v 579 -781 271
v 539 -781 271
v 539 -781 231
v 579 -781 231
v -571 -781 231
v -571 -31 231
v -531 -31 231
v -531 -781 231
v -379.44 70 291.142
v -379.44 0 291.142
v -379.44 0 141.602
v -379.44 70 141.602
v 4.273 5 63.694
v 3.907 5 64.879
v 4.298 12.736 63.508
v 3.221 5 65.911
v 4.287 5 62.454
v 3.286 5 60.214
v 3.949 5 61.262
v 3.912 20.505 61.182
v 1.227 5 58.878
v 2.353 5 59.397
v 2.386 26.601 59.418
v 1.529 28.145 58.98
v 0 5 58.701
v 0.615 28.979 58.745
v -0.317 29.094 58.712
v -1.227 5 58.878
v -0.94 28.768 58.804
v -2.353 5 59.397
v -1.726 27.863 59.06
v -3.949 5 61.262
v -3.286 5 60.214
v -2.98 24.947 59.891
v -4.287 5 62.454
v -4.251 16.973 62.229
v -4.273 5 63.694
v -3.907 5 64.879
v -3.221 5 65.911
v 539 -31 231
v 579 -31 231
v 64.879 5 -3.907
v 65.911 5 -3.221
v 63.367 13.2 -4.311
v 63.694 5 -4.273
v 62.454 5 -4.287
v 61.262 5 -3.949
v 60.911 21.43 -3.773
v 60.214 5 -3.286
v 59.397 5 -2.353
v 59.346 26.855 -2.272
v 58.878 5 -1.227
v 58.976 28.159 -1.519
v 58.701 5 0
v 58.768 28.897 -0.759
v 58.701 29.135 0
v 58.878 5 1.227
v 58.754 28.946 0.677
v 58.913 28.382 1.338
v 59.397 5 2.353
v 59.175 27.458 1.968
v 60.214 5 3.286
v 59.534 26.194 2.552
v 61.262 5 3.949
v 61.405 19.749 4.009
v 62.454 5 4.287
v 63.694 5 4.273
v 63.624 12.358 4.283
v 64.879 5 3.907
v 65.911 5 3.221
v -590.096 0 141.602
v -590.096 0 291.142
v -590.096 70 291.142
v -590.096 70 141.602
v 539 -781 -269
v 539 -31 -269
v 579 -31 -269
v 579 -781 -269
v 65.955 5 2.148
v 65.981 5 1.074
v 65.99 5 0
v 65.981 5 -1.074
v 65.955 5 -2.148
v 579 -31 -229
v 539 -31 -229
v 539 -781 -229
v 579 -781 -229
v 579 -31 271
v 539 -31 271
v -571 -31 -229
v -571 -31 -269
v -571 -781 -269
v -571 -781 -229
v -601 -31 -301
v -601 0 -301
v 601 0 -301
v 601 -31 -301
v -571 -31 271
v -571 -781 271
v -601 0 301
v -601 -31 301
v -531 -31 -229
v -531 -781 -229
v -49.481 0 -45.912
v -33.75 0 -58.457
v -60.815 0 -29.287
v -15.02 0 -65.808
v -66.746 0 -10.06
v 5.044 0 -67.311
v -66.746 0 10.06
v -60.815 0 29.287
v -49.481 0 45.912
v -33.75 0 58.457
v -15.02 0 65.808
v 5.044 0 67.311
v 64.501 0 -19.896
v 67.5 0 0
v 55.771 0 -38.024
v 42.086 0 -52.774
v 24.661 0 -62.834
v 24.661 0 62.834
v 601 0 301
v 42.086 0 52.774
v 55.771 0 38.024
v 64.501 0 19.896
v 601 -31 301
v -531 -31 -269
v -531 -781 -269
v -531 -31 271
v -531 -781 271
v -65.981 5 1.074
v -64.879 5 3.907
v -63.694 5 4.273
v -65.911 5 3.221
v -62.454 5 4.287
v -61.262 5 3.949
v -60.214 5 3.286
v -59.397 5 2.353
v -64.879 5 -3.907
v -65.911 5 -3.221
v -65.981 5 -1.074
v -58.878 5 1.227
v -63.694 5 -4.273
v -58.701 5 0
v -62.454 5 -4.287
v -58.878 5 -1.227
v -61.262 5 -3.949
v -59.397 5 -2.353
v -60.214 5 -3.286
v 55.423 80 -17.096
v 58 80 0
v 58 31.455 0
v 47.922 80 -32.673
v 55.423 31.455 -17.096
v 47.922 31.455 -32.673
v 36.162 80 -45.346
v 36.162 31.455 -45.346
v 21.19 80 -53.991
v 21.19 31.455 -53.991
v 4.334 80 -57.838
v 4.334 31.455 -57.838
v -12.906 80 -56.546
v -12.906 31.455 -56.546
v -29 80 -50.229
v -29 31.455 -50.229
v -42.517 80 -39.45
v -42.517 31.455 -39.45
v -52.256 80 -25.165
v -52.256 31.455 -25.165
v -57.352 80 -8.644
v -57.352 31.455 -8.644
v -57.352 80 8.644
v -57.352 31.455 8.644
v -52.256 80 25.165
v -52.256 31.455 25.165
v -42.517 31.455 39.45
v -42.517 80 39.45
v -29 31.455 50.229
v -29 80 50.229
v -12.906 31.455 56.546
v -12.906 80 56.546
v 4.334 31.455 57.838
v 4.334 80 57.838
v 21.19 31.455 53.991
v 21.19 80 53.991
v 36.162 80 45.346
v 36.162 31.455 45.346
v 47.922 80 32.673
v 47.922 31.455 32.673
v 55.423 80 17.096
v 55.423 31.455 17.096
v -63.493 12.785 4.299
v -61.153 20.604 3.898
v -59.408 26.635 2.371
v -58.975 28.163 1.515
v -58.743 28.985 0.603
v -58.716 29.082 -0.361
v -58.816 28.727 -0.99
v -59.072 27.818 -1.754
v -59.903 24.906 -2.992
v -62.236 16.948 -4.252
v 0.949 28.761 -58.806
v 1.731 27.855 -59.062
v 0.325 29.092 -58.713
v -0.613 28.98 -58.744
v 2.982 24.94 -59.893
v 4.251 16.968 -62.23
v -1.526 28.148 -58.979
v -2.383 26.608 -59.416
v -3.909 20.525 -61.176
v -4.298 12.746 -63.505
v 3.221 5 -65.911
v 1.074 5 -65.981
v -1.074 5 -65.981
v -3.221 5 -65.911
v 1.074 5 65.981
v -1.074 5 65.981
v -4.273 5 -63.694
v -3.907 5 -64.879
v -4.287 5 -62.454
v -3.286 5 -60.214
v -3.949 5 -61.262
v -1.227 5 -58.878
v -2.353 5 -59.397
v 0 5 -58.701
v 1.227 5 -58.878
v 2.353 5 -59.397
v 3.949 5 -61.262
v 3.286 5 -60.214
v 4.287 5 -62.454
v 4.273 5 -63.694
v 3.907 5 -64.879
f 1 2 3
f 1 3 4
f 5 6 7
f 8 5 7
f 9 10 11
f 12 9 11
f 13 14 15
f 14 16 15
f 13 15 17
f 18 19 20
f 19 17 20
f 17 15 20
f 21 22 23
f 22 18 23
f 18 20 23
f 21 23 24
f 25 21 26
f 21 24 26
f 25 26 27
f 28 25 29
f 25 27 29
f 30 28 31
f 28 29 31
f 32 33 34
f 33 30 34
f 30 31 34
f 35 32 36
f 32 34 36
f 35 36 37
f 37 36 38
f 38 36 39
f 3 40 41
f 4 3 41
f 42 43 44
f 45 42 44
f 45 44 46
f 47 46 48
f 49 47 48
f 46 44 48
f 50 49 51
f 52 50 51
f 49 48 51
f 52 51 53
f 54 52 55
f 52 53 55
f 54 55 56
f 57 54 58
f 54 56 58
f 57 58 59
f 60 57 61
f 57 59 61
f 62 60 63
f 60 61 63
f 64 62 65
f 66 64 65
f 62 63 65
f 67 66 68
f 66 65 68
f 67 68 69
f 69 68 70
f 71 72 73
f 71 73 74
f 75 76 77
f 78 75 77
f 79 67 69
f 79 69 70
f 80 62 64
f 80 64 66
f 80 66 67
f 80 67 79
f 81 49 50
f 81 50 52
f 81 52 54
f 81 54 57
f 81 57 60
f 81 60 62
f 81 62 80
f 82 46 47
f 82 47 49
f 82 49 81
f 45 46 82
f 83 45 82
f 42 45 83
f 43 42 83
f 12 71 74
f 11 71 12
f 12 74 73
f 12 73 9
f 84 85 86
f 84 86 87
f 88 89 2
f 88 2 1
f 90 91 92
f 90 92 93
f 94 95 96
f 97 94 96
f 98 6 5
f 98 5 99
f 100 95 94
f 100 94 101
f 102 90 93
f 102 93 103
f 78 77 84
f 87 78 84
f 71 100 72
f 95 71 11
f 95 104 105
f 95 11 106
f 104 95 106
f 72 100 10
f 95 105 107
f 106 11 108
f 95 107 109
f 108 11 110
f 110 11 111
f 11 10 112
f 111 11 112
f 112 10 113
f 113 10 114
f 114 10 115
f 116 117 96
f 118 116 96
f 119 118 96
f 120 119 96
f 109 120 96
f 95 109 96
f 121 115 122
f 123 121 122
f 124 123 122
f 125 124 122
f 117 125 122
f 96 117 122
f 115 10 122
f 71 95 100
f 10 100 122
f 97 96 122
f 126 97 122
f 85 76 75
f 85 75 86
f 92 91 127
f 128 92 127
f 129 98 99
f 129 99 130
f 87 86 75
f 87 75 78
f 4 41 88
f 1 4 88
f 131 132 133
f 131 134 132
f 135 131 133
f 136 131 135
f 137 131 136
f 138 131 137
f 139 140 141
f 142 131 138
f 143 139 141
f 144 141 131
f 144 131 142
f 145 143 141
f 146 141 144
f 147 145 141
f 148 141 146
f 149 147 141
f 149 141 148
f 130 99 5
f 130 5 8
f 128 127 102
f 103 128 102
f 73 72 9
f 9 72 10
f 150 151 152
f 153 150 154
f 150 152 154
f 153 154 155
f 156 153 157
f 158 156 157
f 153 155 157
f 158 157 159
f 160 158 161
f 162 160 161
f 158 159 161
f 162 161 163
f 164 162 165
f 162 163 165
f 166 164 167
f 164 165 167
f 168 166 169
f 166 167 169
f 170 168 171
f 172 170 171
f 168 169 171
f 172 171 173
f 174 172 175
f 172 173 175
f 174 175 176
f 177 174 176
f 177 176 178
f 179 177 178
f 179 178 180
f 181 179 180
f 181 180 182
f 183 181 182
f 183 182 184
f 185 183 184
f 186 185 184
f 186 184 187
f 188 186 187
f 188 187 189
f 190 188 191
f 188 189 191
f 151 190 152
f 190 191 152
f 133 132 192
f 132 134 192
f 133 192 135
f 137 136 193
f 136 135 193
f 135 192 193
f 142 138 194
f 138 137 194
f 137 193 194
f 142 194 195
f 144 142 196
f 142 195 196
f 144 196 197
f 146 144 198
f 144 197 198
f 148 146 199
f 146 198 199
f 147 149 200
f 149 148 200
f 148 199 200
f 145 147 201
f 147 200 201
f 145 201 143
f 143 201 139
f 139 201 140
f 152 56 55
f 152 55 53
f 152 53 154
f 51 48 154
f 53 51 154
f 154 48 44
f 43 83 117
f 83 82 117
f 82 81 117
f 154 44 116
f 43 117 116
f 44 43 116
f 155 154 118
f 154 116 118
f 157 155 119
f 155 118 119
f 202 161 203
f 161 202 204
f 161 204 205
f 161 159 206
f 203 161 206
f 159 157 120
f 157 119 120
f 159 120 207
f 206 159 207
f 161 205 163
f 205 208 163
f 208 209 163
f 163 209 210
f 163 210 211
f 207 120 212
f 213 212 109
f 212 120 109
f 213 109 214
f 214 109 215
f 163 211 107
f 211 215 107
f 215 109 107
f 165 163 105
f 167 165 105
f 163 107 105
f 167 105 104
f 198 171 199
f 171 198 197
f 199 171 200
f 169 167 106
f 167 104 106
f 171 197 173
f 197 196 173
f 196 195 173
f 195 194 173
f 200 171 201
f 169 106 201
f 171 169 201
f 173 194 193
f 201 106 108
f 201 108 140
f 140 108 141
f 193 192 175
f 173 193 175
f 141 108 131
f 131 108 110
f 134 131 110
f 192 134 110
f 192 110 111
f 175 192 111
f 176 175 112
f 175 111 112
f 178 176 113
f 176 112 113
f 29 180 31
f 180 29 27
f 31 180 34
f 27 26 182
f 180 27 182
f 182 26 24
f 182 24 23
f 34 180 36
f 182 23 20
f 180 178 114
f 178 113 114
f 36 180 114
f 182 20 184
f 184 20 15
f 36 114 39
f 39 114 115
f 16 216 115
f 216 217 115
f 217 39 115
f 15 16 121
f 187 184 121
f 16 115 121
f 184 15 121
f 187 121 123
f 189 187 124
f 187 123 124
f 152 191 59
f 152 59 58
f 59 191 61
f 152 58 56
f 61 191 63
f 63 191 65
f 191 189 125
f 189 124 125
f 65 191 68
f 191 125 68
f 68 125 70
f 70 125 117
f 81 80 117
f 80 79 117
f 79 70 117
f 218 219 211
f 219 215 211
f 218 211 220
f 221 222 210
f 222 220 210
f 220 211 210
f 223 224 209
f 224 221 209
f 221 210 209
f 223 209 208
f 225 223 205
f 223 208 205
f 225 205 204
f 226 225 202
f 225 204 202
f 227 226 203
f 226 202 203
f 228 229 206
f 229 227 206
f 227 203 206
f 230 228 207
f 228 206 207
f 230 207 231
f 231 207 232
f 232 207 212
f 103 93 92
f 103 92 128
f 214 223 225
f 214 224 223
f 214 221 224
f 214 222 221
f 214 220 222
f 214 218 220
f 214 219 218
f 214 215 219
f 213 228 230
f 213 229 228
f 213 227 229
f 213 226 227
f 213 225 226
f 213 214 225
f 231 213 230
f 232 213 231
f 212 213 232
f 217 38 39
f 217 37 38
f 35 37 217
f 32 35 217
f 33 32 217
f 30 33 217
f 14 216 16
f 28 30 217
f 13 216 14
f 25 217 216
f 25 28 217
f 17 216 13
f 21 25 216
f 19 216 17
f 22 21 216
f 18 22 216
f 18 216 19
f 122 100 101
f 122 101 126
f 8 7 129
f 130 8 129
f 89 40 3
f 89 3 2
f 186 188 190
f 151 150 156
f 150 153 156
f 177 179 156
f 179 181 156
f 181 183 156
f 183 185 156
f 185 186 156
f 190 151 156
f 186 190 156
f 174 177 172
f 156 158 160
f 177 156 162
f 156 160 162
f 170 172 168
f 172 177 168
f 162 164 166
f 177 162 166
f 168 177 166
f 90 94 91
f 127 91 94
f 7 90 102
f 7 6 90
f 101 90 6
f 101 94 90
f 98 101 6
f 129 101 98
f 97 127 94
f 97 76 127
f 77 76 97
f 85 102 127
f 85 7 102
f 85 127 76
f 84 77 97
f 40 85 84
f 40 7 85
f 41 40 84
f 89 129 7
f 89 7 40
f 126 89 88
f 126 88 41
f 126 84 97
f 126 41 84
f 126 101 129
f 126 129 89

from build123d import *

# Parameters (mm, degrees)
CORTAR_EXTRUIR1_START   = -50
CROQUIS2_R              = 4.324629937
CORTAR_EXTRUIR1_DEPTH   = 25
CROQUIS3_W              = 1202
CROQUIS3_H              = 602
SALIENTE_EXTRUIR1_DEPTH = 31
CROQUIS4_W              = 40
CROQUIS4_H              = 40
SALIENTE_EXTRUIR2_DEPTH = 750
CROQUIS5_W              = 210.655681701
CROQUIS5_H              = 149.539527133
SALIENTE_EXTRUIR3_DEPTH = 70


with BuildPart() as part:
    # Croquis1 → Revolución1 (revolve)
    with BuildSketch(Plane.XY, mode=Mode.PRIVATE) as revoluci_n1_sk:
        Polygon((0, 0), (0, 80), (-58, 80), (-58, 31.455108359), (-67.5, 0), align=None)
    revolve(revoluci_n1_sk.sketch.rotate(Axis((0, 0, 0), (0, 1, 0)), 180), axis=Axis((0, 0, 0), (0, 1, 0)))

    # Croquis2 → Cortar-Extruir1 (cut)
    with BuildSketch(Plane(origin=(0, 80, 0), x_dir=(1, 0, 0), z_dir=(0, 1, 0)).offset(CORTAR_EXTRUIR1_START)):
        with Locations((0, 63.025248345)):
            Circle(CROQUIS2_R)
        with Locations((63.025248345, 0)):
            Circle(CROQUIS2_R)
        with Locations((0, -63.025248345)):
            Circle(CROQUIS2_R)
        with Locations((-63.025248345, 0)):
            Circle(CROQUIS2_R)
    extrude(amount=-CORTAR_EXTRUIR1_DEPTH, mode=Mode.SUBTRACT)

    # Croquis3 → Saliente-Extruir1 (add)
    with BuildSketch(Plane.XZ):
        Rectangle(CROQUIS3_W, CROQUIS3_H)
    extrude(amount=SALIENTE_EXTRUIR1_DEPTH)

    # Croquis4 → Saliente-Extruir2 (add)
    with BuildSketch(Plane.XZ.offset(31)):
        with Locations((-551, 251)):
            Rectangle(CROQUIS4_W, CROQUIS4_H)
        with Locations((559, 251)):
            Rectangle(CROQUIS4_W, CROQUIS4_H)
        with Locations((559, -249)):
            Rectangle(CROQUIS4_W, CROQUIS4_H)
        with Locations((-551, -249)):
            Rectangle(CROQUIS4_W, CROQUIS4_H)
    extrude(amount=SALIENTE_EXTRUIR2_DEPTH)

    # Croquis5 → Saliente-Extruir3 (add)
    with BuildSketch(Plane(origin=(0, 0, 0), x_dir=(1, 0, 0), z_dir=(0, 1, 0))):
        with Locations((-484.76769938, -216.371921998)):
            Rectangle(CROQUIS5_W, CROQUIS5_H)
    extrude(amount=SALIENTE_EXTRUIR3_DEPTH)


solid = part.part
